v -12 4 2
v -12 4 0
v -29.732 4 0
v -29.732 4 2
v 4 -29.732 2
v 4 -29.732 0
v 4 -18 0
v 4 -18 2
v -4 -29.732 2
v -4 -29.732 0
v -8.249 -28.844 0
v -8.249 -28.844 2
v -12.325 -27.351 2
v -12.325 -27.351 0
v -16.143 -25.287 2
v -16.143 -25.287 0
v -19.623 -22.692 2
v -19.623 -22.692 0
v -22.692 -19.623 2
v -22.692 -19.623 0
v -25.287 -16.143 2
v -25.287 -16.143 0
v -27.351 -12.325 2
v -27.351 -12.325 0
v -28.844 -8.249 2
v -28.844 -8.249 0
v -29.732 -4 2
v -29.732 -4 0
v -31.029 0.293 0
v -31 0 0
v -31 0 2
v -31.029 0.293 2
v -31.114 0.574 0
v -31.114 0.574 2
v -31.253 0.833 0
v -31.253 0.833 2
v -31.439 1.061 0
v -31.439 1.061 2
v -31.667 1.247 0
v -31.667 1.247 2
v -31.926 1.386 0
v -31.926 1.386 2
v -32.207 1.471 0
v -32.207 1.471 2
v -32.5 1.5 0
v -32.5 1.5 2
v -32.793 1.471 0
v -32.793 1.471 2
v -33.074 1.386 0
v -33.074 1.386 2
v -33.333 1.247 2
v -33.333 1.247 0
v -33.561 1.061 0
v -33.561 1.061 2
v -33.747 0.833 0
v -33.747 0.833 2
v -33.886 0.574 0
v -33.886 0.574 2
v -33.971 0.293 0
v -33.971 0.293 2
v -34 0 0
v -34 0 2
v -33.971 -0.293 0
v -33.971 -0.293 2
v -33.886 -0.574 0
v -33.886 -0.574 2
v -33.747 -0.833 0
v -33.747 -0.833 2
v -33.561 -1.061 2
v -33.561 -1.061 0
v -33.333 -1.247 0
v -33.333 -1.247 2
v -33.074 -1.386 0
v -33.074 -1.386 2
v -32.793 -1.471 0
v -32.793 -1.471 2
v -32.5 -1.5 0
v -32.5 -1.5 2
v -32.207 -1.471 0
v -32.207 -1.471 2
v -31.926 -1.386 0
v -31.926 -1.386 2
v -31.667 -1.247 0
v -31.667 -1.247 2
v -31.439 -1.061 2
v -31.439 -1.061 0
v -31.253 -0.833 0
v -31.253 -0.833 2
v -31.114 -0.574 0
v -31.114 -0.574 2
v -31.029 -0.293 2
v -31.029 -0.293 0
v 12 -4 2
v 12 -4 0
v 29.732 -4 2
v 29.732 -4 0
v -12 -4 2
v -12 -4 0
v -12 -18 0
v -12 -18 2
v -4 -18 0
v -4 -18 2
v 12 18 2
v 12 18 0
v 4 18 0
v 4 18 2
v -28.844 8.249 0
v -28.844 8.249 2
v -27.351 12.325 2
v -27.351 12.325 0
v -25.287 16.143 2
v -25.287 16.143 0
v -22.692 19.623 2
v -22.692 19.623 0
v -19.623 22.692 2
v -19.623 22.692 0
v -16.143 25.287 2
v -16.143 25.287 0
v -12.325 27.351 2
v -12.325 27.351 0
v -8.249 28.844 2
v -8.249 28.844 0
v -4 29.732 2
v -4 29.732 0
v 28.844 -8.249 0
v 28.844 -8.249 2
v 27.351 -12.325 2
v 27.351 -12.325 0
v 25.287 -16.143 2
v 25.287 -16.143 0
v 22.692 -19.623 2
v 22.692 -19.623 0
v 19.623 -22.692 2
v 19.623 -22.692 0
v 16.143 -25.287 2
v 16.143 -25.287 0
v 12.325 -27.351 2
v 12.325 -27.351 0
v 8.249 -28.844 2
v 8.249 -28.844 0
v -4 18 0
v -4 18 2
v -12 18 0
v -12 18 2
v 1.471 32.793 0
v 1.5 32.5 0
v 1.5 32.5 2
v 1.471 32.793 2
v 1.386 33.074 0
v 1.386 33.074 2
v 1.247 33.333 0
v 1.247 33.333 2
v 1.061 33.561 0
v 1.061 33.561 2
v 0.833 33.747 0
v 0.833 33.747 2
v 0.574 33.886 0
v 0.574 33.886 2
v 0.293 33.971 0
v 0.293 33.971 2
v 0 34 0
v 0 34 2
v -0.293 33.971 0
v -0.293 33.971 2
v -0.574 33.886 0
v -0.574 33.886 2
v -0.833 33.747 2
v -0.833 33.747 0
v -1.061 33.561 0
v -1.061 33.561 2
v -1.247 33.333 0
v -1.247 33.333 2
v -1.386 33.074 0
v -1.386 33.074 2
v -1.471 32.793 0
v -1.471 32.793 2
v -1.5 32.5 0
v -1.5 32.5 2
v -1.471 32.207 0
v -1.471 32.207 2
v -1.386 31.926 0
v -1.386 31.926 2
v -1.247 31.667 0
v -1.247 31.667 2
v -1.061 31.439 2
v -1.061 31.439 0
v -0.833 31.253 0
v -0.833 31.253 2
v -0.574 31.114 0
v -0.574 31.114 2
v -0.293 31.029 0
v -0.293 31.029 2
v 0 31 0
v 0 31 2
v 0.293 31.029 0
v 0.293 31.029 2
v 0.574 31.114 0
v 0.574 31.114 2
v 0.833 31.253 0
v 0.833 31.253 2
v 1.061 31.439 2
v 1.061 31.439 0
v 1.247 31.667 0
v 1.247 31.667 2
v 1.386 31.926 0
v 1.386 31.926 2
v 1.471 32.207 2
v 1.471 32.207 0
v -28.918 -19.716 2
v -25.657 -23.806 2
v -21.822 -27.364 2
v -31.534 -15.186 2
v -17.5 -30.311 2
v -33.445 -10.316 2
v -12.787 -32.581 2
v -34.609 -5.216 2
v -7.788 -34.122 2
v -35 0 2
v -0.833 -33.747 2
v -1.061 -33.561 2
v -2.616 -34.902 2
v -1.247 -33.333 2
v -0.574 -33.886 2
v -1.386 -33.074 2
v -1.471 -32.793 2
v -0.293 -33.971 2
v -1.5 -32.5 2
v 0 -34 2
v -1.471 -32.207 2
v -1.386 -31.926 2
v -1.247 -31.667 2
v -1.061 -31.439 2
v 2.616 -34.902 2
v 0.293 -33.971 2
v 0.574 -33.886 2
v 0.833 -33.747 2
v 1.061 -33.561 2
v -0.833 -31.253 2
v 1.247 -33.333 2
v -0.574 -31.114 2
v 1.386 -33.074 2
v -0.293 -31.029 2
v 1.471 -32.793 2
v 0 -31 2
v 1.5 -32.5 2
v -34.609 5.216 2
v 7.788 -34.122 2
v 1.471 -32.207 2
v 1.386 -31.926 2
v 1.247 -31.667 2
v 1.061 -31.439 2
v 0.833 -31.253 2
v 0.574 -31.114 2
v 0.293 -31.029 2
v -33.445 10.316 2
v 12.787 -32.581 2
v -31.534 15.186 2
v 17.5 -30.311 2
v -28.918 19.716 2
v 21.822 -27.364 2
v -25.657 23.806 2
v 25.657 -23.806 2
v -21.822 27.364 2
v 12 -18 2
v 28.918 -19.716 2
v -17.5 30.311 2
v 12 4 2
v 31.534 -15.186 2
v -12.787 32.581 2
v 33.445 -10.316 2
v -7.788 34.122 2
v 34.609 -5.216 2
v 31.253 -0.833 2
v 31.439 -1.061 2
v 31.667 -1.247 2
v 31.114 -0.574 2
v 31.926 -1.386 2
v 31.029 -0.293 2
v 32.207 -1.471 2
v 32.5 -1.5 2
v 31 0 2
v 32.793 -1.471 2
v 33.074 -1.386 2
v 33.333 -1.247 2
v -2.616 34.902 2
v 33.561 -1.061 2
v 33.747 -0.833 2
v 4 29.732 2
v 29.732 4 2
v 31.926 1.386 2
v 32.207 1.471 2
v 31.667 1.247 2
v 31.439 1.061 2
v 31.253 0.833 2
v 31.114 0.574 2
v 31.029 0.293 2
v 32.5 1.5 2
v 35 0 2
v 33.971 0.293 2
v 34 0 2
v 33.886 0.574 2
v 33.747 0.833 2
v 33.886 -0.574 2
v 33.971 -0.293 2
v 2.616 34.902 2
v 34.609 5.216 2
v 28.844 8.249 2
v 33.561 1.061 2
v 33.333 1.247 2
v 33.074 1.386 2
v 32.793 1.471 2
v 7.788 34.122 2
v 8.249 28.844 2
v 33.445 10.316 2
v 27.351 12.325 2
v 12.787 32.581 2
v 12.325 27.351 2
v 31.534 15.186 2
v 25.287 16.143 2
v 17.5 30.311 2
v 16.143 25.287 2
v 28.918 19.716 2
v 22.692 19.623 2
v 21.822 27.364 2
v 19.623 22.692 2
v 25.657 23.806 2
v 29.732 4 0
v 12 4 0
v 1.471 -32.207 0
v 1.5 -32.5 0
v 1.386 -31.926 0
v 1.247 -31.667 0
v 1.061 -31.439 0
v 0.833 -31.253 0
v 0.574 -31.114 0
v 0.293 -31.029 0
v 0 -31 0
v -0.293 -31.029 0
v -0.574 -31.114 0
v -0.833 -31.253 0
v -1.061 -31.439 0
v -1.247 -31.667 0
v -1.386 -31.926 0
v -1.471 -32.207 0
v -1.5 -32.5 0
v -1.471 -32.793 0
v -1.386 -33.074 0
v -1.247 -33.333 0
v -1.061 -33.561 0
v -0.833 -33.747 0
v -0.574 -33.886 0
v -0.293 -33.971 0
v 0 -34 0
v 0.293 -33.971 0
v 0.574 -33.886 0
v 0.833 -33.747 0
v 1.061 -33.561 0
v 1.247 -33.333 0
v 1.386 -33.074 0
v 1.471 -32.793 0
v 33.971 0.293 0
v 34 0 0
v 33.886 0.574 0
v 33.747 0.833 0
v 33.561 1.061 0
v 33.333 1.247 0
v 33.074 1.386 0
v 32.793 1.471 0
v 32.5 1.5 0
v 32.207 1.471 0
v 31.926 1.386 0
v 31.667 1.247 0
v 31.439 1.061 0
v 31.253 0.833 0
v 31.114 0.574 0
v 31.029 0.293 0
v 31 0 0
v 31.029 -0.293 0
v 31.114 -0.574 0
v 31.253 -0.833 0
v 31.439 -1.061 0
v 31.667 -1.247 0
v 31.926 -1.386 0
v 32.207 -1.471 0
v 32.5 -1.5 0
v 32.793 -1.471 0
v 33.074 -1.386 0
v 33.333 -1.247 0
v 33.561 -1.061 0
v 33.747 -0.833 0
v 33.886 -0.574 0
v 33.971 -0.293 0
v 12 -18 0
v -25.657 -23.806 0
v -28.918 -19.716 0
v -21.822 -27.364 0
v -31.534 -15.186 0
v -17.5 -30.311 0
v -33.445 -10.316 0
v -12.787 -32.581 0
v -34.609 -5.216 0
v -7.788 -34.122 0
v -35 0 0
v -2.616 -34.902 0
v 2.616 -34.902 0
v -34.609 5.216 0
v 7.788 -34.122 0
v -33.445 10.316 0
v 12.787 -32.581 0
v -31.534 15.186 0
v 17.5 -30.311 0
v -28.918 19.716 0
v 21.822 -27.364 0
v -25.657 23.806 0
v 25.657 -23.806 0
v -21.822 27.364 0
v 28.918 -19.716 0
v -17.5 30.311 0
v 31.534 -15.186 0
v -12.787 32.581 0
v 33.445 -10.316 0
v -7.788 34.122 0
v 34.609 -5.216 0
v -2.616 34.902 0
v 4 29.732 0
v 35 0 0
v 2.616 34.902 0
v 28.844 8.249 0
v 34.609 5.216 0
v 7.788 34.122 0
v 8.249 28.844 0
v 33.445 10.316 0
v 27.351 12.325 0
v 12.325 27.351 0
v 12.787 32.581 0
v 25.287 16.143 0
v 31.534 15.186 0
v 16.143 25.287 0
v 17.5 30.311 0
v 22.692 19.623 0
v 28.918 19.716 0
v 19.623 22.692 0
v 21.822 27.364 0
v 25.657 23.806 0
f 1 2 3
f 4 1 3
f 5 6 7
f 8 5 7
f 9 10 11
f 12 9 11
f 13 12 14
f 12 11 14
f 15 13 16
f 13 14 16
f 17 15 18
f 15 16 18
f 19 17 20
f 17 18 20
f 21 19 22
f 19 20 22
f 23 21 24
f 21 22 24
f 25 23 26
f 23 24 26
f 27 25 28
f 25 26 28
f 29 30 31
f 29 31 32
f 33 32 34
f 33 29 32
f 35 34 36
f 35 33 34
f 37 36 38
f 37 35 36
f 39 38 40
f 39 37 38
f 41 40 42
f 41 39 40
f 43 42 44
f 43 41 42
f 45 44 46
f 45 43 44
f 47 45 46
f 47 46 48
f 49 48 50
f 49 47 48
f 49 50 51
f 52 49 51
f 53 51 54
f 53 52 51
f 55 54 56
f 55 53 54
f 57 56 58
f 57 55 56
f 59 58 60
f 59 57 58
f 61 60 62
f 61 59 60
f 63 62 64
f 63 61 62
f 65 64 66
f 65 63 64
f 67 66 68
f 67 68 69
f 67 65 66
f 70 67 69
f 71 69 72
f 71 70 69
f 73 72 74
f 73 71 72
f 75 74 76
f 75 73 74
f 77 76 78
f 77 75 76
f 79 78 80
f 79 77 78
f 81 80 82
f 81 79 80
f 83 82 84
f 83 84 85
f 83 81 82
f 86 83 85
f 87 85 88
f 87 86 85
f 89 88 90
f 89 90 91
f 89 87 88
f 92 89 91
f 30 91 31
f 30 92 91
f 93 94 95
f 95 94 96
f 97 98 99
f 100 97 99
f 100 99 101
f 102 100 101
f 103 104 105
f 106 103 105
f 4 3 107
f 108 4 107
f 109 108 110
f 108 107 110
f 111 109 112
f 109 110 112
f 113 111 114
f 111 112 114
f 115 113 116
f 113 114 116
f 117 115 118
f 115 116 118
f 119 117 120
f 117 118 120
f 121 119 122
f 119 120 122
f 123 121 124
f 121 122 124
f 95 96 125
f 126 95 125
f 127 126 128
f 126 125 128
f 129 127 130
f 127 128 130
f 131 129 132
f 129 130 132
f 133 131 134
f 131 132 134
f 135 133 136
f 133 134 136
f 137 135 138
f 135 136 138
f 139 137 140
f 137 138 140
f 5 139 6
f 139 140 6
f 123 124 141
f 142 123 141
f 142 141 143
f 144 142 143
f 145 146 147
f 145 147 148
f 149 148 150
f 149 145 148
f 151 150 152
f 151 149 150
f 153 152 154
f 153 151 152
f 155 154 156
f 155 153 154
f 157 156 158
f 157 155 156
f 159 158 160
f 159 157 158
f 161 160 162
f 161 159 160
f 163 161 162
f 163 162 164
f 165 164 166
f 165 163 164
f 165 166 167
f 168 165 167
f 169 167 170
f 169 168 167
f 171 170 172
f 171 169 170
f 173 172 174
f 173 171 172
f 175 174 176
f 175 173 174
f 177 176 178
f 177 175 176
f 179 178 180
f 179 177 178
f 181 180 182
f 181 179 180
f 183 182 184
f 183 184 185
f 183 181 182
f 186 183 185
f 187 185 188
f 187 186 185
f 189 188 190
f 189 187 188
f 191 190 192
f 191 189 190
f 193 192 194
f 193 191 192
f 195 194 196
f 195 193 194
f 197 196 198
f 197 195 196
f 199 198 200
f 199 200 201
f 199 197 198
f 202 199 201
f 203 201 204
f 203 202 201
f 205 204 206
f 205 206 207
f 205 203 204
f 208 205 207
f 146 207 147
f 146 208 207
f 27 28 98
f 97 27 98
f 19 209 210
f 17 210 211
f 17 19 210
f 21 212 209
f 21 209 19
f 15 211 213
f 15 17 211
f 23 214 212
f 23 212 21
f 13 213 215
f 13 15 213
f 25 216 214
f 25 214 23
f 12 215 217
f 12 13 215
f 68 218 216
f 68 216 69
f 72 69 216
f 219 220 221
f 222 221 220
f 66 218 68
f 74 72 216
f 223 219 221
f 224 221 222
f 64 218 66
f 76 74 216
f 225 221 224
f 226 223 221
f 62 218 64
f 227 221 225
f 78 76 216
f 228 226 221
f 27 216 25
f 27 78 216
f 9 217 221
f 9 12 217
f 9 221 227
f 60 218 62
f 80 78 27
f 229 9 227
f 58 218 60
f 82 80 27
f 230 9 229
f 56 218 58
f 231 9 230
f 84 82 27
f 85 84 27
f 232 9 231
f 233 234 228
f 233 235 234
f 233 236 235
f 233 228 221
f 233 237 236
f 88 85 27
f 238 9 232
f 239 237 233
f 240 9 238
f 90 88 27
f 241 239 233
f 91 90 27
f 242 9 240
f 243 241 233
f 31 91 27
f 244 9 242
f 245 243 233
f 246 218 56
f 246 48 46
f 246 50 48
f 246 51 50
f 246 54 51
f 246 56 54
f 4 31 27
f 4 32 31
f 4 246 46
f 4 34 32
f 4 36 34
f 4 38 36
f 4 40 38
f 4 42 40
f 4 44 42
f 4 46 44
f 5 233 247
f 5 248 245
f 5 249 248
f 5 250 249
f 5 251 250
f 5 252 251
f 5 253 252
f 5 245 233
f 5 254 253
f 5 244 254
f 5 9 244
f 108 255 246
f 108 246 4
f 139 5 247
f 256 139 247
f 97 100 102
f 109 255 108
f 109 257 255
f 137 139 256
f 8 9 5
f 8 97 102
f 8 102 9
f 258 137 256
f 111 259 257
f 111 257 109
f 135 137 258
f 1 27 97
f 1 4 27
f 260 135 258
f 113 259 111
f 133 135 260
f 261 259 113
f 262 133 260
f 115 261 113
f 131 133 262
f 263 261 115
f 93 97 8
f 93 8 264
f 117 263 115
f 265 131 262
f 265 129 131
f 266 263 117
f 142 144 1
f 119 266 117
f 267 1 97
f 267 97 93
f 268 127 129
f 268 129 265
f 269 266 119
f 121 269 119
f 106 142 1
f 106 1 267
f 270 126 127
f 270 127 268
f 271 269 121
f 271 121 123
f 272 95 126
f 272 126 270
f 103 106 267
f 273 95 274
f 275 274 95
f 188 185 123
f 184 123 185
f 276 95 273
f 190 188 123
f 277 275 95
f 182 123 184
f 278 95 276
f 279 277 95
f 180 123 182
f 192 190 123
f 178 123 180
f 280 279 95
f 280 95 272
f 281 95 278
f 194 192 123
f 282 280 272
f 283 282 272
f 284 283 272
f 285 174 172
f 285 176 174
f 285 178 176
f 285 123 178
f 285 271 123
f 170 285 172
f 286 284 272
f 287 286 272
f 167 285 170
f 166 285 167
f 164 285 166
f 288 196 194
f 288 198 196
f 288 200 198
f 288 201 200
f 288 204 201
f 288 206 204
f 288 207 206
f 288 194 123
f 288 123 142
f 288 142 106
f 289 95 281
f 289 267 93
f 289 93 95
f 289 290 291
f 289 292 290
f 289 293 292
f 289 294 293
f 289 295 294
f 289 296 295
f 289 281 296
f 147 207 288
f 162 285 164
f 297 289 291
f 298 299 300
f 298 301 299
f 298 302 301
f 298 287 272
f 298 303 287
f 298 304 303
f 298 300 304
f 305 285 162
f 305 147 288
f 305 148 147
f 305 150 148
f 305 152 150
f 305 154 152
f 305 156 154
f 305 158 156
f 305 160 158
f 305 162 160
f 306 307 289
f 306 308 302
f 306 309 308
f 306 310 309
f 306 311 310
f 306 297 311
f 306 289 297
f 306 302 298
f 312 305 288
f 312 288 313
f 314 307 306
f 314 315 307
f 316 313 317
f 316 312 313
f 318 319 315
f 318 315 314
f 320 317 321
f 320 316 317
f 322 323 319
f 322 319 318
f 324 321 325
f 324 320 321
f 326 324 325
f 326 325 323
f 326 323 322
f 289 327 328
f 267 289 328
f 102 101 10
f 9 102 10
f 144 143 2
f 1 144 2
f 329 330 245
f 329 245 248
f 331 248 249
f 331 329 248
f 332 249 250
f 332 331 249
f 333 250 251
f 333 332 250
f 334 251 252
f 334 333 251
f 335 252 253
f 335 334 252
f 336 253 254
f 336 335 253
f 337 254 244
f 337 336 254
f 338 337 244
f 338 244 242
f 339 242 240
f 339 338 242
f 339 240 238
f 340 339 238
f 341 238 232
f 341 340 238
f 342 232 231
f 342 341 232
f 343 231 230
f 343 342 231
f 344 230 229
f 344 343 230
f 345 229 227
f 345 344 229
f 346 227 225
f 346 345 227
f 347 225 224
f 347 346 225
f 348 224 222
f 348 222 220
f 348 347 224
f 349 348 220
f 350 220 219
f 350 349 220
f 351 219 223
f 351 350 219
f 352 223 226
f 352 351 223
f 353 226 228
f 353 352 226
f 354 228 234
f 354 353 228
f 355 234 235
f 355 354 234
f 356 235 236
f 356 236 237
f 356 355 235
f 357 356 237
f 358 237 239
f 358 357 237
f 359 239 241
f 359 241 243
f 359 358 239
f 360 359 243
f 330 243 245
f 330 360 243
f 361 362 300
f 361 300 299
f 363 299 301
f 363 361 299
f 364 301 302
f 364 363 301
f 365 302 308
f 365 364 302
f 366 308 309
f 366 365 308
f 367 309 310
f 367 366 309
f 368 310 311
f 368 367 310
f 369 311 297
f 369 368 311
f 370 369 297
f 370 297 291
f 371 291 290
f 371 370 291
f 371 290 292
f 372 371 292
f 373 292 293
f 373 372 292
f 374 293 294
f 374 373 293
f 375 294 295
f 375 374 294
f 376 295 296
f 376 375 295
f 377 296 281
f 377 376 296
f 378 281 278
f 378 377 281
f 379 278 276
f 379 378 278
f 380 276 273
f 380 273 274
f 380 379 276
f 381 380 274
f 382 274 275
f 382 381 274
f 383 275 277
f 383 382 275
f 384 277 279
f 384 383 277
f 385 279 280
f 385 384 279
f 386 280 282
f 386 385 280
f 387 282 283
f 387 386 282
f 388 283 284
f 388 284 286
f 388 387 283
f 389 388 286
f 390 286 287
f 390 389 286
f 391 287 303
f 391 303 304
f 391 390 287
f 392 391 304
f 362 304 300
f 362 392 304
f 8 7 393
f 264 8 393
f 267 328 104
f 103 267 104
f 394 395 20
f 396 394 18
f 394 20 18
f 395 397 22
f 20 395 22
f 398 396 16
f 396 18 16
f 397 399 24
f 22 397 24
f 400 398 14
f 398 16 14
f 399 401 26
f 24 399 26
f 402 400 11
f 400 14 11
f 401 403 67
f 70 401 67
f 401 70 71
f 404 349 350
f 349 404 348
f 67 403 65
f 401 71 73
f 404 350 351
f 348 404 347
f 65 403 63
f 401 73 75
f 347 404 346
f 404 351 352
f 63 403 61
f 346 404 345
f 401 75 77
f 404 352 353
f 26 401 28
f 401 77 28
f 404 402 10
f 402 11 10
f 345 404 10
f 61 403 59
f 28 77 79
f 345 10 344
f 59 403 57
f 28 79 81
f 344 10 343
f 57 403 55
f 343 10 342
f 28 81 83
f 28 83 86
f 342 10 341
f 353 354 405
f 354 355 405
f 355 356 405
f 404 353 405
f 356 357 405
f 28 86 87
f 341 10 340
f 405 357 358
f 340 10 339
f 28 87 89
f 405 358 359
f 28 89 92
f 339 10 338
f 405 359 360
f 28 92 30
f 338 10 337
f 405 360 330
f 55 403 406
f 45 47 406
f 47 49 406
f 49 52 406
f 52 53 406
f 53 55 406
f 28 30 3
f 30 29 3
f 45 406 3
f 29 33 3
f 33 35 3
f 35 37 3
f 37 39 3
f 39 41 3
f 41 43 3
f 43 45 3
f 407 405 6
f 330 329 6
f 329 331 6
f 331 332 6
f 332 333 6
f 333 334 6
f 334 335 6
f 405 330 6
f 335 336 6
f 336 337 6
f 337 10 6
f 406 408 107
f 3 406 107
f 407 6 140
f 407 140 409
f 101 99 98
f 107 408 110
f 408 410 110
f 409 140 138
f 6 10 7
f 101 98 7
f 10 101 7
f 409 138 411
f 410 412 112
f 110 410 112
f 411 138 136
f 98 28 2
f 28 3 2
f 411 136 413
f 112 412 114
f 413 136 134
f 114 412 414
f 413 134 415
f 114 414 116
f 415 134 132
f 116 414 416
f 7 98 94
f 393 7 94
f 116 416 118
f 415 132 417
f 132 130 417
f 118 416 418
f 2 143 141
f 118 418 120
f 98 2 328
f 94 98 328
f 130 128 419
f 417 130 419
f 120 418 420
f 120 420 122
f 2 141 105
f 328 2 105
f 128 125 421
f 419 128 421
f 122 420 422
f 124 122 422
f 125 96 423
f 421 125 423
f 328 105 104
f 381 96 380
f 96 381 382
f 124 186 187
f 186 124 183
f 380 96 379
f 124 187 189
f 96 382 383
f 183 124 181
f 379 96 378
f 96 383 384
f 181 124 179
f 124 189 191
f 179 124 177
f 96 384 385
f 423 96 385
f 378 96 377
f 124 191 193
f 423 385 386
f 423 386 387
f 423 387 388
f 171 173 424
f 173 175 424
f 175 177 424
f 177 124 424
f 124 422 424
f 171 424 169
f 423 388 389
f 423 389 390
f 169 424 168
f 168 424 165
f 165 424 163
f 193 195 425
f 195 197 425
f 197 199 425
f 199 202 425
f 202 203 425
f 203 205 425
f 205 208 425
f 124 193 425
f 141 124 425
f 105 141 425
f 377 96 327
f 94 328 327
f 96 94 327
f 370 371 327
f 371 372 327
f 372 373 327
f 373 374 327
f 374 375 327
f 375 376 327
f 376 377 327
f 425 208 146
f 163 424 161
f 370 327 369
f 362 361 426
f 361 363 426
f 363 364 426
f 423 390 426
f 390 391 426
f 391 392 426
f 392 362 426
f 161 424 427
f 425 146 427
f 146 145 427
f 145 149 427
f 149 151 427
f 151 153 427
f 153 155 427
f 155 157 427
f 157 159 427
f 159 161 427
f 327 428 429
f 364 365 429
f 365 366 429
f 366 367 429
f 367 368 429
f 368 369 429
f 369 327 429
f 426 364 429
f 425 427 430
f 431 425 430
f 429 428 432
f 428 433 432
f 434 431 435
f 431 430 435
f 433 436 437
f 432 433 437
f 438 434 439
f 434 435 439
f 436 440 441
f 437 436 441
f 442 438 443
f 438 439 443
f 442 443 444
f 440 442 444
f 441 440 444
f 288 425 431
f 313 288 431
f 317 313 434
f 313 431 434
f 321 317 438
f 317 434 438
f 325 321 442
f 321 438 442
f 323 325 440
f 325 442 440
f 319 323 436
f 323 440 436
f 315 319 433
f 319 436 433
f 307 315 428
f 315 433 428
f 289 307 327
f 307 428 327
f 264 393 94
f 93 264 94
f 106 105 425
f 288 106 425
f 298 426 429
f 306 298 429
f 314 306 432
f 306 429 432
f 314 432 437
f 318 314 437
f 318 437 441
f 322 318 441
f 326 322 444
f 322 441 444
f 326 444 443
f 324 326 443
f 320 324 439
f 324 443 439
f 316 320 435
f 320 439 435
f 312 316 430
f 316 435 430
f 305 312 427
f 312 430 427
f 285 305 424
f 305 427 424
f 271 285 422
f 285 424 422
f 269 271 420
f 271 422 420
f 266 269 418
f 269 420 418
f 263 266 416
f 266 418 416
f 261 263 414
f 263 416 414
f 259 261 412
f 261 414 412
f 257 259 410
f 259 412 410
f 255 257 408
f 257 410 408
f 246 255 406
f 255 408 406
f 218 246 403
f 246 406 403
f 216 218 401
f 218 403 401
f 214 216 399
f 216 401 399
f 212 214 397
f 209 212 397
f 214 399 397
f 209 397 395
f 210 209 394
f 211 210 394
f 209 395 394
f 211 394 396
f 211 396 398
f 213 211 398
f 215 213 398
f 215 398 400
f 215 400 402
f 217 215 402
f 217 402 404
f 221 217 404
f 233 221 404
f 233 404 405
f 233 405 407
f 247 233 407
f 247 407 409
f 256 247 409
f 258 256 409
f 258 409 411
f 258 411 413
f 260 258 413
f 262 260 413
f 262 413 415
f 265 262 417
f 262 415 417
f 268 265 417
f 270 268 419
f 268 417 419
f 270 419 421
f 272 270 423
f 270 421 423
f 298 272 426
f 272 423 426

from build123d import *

# Parameters (mm, degrees)
F0_R     = 35
F0_R_2   = 1.5
F0_W     = 19.983293198
F0_H     = 32
F1_DEPTH = 2


# Not quite as in the source:
# - a feature names something its author has since deleted; it is built from what else it names


with BuildPart() as f1:
    # F0 (on Top) → F1 (new body)
    with BuildSketch(Plane.XY):
        Circle(F0_R)
        with Locations((0, -32.5)):
            Circle(F0_R_2, mode=Mode.SUBTRACT)
        with Locations((-32.5, 0)):
            Circle(F0_R_2, mode=Mode.SUBTRACT)
        with BuildLine():
            ThreePointArc((29.7321374946, 4), (29.9329594664, 2.0044793789), (30, 0))
            ThreePointArc((30, 0), (29.9329594664, -2.0044793789), (29.7321374946, -4))
            ThreePointArc((29.7321374946, -4), (21.2132034356, -21.2132034356), (4, -29.7321374946))
            ThreePointArc((4, -29.7321374946), (0, -30), (-4, -29.7321374946))
            ThreePointArc((-4, -29.7321374946), (-21.2132034356, -21.2132034356), (-29.7321374946, -4))
            ThreePointArc((-29.7321374946, -4), (-30, 0), (-29.7321374946, 4))
            ThreePointArc((-29.7321374946, 4), (-21.2132034356, 21.2132034356), (-4, 29.7321374946))
            ThreePointArc((-4, 29.7321374946), (0, 30), (4, 29.7321374946))
            ThreePointArc((4, 29.7321374946), (21.2132034356, 21.2132034356), (29.7321374946, 4))
        make_face(mode=Mode.SUBTRACT)
        with Locations((32.5, 0)):
            Circle(F0_R_2, mode=Mode.SUBTRACT)
        with Locations((0, 32.5)):
            Circle(F0_R_2, mode=Mode.SUBTRACT)
        with BuildLine():
            Line((4, 18), (4, 29.7321374946))
            ThreePointArc((4, 29.7321374946), (0, 30), (-4, 29.7321374946))
            Line((-4, 29.7321374946), (-4, 18))
            Line((-4, 18), (4, 18))
        make_face()
        with BuildLine():
            Line((-12, 4), (-29.7321374946, 4))
            ThreePointArc((-29.7321374946, 4), (-30, 0), (-29.7321374946, -4))
            Line((-29.7321374946, -4), (-12, -4))
            Line((-12, -4), (-12, 4))
        make_face()
        with BuildLine():
            ThreePointArc((-4, -29.7321374946), (0, -30), (4, -29.7321374946))
            Line((4, -29.7321374946), (4, -18))
            Line((4, -18), (-4, -18))
            Line((-4, -18), (-4, -29.7321374946))
        make_face()
        Polygon((12, -4), (12, 4), (12, 12.1005004627), (12, 18), (4, 18), (-4, 18), (-12, 18), (-12, 4), (-12, -4), (-12, -18), (-4, -18), (4, -18), (12, -18), (12, -5.151443038), align=None)
        with Locations((0.1530251862, 0.242334145)):
            Rectangle(F0_W, F0_H, mode=Mode.SUBTRACT)
        with Locations((0.1530251862, 0.242334145)):
            Rectangle(F0_W, F0_H)
        with BuildLine():
            ThreePointArc((29.7321374946, -4), (29.9329594664, -2.0044793789), (30, 0))
            ThreePointArc((30, 0), (29.9329594664, 2.0044793789), (29.7321374946, 4))
            Line((29.7321374946, 4), (12, 4))
            Line((12, 4), (12, -4))
            Line((12, -4), (29.7321374946, -4))
        make_face()
    extrude(amount=F1_DEPTH)


solid = f1.part
